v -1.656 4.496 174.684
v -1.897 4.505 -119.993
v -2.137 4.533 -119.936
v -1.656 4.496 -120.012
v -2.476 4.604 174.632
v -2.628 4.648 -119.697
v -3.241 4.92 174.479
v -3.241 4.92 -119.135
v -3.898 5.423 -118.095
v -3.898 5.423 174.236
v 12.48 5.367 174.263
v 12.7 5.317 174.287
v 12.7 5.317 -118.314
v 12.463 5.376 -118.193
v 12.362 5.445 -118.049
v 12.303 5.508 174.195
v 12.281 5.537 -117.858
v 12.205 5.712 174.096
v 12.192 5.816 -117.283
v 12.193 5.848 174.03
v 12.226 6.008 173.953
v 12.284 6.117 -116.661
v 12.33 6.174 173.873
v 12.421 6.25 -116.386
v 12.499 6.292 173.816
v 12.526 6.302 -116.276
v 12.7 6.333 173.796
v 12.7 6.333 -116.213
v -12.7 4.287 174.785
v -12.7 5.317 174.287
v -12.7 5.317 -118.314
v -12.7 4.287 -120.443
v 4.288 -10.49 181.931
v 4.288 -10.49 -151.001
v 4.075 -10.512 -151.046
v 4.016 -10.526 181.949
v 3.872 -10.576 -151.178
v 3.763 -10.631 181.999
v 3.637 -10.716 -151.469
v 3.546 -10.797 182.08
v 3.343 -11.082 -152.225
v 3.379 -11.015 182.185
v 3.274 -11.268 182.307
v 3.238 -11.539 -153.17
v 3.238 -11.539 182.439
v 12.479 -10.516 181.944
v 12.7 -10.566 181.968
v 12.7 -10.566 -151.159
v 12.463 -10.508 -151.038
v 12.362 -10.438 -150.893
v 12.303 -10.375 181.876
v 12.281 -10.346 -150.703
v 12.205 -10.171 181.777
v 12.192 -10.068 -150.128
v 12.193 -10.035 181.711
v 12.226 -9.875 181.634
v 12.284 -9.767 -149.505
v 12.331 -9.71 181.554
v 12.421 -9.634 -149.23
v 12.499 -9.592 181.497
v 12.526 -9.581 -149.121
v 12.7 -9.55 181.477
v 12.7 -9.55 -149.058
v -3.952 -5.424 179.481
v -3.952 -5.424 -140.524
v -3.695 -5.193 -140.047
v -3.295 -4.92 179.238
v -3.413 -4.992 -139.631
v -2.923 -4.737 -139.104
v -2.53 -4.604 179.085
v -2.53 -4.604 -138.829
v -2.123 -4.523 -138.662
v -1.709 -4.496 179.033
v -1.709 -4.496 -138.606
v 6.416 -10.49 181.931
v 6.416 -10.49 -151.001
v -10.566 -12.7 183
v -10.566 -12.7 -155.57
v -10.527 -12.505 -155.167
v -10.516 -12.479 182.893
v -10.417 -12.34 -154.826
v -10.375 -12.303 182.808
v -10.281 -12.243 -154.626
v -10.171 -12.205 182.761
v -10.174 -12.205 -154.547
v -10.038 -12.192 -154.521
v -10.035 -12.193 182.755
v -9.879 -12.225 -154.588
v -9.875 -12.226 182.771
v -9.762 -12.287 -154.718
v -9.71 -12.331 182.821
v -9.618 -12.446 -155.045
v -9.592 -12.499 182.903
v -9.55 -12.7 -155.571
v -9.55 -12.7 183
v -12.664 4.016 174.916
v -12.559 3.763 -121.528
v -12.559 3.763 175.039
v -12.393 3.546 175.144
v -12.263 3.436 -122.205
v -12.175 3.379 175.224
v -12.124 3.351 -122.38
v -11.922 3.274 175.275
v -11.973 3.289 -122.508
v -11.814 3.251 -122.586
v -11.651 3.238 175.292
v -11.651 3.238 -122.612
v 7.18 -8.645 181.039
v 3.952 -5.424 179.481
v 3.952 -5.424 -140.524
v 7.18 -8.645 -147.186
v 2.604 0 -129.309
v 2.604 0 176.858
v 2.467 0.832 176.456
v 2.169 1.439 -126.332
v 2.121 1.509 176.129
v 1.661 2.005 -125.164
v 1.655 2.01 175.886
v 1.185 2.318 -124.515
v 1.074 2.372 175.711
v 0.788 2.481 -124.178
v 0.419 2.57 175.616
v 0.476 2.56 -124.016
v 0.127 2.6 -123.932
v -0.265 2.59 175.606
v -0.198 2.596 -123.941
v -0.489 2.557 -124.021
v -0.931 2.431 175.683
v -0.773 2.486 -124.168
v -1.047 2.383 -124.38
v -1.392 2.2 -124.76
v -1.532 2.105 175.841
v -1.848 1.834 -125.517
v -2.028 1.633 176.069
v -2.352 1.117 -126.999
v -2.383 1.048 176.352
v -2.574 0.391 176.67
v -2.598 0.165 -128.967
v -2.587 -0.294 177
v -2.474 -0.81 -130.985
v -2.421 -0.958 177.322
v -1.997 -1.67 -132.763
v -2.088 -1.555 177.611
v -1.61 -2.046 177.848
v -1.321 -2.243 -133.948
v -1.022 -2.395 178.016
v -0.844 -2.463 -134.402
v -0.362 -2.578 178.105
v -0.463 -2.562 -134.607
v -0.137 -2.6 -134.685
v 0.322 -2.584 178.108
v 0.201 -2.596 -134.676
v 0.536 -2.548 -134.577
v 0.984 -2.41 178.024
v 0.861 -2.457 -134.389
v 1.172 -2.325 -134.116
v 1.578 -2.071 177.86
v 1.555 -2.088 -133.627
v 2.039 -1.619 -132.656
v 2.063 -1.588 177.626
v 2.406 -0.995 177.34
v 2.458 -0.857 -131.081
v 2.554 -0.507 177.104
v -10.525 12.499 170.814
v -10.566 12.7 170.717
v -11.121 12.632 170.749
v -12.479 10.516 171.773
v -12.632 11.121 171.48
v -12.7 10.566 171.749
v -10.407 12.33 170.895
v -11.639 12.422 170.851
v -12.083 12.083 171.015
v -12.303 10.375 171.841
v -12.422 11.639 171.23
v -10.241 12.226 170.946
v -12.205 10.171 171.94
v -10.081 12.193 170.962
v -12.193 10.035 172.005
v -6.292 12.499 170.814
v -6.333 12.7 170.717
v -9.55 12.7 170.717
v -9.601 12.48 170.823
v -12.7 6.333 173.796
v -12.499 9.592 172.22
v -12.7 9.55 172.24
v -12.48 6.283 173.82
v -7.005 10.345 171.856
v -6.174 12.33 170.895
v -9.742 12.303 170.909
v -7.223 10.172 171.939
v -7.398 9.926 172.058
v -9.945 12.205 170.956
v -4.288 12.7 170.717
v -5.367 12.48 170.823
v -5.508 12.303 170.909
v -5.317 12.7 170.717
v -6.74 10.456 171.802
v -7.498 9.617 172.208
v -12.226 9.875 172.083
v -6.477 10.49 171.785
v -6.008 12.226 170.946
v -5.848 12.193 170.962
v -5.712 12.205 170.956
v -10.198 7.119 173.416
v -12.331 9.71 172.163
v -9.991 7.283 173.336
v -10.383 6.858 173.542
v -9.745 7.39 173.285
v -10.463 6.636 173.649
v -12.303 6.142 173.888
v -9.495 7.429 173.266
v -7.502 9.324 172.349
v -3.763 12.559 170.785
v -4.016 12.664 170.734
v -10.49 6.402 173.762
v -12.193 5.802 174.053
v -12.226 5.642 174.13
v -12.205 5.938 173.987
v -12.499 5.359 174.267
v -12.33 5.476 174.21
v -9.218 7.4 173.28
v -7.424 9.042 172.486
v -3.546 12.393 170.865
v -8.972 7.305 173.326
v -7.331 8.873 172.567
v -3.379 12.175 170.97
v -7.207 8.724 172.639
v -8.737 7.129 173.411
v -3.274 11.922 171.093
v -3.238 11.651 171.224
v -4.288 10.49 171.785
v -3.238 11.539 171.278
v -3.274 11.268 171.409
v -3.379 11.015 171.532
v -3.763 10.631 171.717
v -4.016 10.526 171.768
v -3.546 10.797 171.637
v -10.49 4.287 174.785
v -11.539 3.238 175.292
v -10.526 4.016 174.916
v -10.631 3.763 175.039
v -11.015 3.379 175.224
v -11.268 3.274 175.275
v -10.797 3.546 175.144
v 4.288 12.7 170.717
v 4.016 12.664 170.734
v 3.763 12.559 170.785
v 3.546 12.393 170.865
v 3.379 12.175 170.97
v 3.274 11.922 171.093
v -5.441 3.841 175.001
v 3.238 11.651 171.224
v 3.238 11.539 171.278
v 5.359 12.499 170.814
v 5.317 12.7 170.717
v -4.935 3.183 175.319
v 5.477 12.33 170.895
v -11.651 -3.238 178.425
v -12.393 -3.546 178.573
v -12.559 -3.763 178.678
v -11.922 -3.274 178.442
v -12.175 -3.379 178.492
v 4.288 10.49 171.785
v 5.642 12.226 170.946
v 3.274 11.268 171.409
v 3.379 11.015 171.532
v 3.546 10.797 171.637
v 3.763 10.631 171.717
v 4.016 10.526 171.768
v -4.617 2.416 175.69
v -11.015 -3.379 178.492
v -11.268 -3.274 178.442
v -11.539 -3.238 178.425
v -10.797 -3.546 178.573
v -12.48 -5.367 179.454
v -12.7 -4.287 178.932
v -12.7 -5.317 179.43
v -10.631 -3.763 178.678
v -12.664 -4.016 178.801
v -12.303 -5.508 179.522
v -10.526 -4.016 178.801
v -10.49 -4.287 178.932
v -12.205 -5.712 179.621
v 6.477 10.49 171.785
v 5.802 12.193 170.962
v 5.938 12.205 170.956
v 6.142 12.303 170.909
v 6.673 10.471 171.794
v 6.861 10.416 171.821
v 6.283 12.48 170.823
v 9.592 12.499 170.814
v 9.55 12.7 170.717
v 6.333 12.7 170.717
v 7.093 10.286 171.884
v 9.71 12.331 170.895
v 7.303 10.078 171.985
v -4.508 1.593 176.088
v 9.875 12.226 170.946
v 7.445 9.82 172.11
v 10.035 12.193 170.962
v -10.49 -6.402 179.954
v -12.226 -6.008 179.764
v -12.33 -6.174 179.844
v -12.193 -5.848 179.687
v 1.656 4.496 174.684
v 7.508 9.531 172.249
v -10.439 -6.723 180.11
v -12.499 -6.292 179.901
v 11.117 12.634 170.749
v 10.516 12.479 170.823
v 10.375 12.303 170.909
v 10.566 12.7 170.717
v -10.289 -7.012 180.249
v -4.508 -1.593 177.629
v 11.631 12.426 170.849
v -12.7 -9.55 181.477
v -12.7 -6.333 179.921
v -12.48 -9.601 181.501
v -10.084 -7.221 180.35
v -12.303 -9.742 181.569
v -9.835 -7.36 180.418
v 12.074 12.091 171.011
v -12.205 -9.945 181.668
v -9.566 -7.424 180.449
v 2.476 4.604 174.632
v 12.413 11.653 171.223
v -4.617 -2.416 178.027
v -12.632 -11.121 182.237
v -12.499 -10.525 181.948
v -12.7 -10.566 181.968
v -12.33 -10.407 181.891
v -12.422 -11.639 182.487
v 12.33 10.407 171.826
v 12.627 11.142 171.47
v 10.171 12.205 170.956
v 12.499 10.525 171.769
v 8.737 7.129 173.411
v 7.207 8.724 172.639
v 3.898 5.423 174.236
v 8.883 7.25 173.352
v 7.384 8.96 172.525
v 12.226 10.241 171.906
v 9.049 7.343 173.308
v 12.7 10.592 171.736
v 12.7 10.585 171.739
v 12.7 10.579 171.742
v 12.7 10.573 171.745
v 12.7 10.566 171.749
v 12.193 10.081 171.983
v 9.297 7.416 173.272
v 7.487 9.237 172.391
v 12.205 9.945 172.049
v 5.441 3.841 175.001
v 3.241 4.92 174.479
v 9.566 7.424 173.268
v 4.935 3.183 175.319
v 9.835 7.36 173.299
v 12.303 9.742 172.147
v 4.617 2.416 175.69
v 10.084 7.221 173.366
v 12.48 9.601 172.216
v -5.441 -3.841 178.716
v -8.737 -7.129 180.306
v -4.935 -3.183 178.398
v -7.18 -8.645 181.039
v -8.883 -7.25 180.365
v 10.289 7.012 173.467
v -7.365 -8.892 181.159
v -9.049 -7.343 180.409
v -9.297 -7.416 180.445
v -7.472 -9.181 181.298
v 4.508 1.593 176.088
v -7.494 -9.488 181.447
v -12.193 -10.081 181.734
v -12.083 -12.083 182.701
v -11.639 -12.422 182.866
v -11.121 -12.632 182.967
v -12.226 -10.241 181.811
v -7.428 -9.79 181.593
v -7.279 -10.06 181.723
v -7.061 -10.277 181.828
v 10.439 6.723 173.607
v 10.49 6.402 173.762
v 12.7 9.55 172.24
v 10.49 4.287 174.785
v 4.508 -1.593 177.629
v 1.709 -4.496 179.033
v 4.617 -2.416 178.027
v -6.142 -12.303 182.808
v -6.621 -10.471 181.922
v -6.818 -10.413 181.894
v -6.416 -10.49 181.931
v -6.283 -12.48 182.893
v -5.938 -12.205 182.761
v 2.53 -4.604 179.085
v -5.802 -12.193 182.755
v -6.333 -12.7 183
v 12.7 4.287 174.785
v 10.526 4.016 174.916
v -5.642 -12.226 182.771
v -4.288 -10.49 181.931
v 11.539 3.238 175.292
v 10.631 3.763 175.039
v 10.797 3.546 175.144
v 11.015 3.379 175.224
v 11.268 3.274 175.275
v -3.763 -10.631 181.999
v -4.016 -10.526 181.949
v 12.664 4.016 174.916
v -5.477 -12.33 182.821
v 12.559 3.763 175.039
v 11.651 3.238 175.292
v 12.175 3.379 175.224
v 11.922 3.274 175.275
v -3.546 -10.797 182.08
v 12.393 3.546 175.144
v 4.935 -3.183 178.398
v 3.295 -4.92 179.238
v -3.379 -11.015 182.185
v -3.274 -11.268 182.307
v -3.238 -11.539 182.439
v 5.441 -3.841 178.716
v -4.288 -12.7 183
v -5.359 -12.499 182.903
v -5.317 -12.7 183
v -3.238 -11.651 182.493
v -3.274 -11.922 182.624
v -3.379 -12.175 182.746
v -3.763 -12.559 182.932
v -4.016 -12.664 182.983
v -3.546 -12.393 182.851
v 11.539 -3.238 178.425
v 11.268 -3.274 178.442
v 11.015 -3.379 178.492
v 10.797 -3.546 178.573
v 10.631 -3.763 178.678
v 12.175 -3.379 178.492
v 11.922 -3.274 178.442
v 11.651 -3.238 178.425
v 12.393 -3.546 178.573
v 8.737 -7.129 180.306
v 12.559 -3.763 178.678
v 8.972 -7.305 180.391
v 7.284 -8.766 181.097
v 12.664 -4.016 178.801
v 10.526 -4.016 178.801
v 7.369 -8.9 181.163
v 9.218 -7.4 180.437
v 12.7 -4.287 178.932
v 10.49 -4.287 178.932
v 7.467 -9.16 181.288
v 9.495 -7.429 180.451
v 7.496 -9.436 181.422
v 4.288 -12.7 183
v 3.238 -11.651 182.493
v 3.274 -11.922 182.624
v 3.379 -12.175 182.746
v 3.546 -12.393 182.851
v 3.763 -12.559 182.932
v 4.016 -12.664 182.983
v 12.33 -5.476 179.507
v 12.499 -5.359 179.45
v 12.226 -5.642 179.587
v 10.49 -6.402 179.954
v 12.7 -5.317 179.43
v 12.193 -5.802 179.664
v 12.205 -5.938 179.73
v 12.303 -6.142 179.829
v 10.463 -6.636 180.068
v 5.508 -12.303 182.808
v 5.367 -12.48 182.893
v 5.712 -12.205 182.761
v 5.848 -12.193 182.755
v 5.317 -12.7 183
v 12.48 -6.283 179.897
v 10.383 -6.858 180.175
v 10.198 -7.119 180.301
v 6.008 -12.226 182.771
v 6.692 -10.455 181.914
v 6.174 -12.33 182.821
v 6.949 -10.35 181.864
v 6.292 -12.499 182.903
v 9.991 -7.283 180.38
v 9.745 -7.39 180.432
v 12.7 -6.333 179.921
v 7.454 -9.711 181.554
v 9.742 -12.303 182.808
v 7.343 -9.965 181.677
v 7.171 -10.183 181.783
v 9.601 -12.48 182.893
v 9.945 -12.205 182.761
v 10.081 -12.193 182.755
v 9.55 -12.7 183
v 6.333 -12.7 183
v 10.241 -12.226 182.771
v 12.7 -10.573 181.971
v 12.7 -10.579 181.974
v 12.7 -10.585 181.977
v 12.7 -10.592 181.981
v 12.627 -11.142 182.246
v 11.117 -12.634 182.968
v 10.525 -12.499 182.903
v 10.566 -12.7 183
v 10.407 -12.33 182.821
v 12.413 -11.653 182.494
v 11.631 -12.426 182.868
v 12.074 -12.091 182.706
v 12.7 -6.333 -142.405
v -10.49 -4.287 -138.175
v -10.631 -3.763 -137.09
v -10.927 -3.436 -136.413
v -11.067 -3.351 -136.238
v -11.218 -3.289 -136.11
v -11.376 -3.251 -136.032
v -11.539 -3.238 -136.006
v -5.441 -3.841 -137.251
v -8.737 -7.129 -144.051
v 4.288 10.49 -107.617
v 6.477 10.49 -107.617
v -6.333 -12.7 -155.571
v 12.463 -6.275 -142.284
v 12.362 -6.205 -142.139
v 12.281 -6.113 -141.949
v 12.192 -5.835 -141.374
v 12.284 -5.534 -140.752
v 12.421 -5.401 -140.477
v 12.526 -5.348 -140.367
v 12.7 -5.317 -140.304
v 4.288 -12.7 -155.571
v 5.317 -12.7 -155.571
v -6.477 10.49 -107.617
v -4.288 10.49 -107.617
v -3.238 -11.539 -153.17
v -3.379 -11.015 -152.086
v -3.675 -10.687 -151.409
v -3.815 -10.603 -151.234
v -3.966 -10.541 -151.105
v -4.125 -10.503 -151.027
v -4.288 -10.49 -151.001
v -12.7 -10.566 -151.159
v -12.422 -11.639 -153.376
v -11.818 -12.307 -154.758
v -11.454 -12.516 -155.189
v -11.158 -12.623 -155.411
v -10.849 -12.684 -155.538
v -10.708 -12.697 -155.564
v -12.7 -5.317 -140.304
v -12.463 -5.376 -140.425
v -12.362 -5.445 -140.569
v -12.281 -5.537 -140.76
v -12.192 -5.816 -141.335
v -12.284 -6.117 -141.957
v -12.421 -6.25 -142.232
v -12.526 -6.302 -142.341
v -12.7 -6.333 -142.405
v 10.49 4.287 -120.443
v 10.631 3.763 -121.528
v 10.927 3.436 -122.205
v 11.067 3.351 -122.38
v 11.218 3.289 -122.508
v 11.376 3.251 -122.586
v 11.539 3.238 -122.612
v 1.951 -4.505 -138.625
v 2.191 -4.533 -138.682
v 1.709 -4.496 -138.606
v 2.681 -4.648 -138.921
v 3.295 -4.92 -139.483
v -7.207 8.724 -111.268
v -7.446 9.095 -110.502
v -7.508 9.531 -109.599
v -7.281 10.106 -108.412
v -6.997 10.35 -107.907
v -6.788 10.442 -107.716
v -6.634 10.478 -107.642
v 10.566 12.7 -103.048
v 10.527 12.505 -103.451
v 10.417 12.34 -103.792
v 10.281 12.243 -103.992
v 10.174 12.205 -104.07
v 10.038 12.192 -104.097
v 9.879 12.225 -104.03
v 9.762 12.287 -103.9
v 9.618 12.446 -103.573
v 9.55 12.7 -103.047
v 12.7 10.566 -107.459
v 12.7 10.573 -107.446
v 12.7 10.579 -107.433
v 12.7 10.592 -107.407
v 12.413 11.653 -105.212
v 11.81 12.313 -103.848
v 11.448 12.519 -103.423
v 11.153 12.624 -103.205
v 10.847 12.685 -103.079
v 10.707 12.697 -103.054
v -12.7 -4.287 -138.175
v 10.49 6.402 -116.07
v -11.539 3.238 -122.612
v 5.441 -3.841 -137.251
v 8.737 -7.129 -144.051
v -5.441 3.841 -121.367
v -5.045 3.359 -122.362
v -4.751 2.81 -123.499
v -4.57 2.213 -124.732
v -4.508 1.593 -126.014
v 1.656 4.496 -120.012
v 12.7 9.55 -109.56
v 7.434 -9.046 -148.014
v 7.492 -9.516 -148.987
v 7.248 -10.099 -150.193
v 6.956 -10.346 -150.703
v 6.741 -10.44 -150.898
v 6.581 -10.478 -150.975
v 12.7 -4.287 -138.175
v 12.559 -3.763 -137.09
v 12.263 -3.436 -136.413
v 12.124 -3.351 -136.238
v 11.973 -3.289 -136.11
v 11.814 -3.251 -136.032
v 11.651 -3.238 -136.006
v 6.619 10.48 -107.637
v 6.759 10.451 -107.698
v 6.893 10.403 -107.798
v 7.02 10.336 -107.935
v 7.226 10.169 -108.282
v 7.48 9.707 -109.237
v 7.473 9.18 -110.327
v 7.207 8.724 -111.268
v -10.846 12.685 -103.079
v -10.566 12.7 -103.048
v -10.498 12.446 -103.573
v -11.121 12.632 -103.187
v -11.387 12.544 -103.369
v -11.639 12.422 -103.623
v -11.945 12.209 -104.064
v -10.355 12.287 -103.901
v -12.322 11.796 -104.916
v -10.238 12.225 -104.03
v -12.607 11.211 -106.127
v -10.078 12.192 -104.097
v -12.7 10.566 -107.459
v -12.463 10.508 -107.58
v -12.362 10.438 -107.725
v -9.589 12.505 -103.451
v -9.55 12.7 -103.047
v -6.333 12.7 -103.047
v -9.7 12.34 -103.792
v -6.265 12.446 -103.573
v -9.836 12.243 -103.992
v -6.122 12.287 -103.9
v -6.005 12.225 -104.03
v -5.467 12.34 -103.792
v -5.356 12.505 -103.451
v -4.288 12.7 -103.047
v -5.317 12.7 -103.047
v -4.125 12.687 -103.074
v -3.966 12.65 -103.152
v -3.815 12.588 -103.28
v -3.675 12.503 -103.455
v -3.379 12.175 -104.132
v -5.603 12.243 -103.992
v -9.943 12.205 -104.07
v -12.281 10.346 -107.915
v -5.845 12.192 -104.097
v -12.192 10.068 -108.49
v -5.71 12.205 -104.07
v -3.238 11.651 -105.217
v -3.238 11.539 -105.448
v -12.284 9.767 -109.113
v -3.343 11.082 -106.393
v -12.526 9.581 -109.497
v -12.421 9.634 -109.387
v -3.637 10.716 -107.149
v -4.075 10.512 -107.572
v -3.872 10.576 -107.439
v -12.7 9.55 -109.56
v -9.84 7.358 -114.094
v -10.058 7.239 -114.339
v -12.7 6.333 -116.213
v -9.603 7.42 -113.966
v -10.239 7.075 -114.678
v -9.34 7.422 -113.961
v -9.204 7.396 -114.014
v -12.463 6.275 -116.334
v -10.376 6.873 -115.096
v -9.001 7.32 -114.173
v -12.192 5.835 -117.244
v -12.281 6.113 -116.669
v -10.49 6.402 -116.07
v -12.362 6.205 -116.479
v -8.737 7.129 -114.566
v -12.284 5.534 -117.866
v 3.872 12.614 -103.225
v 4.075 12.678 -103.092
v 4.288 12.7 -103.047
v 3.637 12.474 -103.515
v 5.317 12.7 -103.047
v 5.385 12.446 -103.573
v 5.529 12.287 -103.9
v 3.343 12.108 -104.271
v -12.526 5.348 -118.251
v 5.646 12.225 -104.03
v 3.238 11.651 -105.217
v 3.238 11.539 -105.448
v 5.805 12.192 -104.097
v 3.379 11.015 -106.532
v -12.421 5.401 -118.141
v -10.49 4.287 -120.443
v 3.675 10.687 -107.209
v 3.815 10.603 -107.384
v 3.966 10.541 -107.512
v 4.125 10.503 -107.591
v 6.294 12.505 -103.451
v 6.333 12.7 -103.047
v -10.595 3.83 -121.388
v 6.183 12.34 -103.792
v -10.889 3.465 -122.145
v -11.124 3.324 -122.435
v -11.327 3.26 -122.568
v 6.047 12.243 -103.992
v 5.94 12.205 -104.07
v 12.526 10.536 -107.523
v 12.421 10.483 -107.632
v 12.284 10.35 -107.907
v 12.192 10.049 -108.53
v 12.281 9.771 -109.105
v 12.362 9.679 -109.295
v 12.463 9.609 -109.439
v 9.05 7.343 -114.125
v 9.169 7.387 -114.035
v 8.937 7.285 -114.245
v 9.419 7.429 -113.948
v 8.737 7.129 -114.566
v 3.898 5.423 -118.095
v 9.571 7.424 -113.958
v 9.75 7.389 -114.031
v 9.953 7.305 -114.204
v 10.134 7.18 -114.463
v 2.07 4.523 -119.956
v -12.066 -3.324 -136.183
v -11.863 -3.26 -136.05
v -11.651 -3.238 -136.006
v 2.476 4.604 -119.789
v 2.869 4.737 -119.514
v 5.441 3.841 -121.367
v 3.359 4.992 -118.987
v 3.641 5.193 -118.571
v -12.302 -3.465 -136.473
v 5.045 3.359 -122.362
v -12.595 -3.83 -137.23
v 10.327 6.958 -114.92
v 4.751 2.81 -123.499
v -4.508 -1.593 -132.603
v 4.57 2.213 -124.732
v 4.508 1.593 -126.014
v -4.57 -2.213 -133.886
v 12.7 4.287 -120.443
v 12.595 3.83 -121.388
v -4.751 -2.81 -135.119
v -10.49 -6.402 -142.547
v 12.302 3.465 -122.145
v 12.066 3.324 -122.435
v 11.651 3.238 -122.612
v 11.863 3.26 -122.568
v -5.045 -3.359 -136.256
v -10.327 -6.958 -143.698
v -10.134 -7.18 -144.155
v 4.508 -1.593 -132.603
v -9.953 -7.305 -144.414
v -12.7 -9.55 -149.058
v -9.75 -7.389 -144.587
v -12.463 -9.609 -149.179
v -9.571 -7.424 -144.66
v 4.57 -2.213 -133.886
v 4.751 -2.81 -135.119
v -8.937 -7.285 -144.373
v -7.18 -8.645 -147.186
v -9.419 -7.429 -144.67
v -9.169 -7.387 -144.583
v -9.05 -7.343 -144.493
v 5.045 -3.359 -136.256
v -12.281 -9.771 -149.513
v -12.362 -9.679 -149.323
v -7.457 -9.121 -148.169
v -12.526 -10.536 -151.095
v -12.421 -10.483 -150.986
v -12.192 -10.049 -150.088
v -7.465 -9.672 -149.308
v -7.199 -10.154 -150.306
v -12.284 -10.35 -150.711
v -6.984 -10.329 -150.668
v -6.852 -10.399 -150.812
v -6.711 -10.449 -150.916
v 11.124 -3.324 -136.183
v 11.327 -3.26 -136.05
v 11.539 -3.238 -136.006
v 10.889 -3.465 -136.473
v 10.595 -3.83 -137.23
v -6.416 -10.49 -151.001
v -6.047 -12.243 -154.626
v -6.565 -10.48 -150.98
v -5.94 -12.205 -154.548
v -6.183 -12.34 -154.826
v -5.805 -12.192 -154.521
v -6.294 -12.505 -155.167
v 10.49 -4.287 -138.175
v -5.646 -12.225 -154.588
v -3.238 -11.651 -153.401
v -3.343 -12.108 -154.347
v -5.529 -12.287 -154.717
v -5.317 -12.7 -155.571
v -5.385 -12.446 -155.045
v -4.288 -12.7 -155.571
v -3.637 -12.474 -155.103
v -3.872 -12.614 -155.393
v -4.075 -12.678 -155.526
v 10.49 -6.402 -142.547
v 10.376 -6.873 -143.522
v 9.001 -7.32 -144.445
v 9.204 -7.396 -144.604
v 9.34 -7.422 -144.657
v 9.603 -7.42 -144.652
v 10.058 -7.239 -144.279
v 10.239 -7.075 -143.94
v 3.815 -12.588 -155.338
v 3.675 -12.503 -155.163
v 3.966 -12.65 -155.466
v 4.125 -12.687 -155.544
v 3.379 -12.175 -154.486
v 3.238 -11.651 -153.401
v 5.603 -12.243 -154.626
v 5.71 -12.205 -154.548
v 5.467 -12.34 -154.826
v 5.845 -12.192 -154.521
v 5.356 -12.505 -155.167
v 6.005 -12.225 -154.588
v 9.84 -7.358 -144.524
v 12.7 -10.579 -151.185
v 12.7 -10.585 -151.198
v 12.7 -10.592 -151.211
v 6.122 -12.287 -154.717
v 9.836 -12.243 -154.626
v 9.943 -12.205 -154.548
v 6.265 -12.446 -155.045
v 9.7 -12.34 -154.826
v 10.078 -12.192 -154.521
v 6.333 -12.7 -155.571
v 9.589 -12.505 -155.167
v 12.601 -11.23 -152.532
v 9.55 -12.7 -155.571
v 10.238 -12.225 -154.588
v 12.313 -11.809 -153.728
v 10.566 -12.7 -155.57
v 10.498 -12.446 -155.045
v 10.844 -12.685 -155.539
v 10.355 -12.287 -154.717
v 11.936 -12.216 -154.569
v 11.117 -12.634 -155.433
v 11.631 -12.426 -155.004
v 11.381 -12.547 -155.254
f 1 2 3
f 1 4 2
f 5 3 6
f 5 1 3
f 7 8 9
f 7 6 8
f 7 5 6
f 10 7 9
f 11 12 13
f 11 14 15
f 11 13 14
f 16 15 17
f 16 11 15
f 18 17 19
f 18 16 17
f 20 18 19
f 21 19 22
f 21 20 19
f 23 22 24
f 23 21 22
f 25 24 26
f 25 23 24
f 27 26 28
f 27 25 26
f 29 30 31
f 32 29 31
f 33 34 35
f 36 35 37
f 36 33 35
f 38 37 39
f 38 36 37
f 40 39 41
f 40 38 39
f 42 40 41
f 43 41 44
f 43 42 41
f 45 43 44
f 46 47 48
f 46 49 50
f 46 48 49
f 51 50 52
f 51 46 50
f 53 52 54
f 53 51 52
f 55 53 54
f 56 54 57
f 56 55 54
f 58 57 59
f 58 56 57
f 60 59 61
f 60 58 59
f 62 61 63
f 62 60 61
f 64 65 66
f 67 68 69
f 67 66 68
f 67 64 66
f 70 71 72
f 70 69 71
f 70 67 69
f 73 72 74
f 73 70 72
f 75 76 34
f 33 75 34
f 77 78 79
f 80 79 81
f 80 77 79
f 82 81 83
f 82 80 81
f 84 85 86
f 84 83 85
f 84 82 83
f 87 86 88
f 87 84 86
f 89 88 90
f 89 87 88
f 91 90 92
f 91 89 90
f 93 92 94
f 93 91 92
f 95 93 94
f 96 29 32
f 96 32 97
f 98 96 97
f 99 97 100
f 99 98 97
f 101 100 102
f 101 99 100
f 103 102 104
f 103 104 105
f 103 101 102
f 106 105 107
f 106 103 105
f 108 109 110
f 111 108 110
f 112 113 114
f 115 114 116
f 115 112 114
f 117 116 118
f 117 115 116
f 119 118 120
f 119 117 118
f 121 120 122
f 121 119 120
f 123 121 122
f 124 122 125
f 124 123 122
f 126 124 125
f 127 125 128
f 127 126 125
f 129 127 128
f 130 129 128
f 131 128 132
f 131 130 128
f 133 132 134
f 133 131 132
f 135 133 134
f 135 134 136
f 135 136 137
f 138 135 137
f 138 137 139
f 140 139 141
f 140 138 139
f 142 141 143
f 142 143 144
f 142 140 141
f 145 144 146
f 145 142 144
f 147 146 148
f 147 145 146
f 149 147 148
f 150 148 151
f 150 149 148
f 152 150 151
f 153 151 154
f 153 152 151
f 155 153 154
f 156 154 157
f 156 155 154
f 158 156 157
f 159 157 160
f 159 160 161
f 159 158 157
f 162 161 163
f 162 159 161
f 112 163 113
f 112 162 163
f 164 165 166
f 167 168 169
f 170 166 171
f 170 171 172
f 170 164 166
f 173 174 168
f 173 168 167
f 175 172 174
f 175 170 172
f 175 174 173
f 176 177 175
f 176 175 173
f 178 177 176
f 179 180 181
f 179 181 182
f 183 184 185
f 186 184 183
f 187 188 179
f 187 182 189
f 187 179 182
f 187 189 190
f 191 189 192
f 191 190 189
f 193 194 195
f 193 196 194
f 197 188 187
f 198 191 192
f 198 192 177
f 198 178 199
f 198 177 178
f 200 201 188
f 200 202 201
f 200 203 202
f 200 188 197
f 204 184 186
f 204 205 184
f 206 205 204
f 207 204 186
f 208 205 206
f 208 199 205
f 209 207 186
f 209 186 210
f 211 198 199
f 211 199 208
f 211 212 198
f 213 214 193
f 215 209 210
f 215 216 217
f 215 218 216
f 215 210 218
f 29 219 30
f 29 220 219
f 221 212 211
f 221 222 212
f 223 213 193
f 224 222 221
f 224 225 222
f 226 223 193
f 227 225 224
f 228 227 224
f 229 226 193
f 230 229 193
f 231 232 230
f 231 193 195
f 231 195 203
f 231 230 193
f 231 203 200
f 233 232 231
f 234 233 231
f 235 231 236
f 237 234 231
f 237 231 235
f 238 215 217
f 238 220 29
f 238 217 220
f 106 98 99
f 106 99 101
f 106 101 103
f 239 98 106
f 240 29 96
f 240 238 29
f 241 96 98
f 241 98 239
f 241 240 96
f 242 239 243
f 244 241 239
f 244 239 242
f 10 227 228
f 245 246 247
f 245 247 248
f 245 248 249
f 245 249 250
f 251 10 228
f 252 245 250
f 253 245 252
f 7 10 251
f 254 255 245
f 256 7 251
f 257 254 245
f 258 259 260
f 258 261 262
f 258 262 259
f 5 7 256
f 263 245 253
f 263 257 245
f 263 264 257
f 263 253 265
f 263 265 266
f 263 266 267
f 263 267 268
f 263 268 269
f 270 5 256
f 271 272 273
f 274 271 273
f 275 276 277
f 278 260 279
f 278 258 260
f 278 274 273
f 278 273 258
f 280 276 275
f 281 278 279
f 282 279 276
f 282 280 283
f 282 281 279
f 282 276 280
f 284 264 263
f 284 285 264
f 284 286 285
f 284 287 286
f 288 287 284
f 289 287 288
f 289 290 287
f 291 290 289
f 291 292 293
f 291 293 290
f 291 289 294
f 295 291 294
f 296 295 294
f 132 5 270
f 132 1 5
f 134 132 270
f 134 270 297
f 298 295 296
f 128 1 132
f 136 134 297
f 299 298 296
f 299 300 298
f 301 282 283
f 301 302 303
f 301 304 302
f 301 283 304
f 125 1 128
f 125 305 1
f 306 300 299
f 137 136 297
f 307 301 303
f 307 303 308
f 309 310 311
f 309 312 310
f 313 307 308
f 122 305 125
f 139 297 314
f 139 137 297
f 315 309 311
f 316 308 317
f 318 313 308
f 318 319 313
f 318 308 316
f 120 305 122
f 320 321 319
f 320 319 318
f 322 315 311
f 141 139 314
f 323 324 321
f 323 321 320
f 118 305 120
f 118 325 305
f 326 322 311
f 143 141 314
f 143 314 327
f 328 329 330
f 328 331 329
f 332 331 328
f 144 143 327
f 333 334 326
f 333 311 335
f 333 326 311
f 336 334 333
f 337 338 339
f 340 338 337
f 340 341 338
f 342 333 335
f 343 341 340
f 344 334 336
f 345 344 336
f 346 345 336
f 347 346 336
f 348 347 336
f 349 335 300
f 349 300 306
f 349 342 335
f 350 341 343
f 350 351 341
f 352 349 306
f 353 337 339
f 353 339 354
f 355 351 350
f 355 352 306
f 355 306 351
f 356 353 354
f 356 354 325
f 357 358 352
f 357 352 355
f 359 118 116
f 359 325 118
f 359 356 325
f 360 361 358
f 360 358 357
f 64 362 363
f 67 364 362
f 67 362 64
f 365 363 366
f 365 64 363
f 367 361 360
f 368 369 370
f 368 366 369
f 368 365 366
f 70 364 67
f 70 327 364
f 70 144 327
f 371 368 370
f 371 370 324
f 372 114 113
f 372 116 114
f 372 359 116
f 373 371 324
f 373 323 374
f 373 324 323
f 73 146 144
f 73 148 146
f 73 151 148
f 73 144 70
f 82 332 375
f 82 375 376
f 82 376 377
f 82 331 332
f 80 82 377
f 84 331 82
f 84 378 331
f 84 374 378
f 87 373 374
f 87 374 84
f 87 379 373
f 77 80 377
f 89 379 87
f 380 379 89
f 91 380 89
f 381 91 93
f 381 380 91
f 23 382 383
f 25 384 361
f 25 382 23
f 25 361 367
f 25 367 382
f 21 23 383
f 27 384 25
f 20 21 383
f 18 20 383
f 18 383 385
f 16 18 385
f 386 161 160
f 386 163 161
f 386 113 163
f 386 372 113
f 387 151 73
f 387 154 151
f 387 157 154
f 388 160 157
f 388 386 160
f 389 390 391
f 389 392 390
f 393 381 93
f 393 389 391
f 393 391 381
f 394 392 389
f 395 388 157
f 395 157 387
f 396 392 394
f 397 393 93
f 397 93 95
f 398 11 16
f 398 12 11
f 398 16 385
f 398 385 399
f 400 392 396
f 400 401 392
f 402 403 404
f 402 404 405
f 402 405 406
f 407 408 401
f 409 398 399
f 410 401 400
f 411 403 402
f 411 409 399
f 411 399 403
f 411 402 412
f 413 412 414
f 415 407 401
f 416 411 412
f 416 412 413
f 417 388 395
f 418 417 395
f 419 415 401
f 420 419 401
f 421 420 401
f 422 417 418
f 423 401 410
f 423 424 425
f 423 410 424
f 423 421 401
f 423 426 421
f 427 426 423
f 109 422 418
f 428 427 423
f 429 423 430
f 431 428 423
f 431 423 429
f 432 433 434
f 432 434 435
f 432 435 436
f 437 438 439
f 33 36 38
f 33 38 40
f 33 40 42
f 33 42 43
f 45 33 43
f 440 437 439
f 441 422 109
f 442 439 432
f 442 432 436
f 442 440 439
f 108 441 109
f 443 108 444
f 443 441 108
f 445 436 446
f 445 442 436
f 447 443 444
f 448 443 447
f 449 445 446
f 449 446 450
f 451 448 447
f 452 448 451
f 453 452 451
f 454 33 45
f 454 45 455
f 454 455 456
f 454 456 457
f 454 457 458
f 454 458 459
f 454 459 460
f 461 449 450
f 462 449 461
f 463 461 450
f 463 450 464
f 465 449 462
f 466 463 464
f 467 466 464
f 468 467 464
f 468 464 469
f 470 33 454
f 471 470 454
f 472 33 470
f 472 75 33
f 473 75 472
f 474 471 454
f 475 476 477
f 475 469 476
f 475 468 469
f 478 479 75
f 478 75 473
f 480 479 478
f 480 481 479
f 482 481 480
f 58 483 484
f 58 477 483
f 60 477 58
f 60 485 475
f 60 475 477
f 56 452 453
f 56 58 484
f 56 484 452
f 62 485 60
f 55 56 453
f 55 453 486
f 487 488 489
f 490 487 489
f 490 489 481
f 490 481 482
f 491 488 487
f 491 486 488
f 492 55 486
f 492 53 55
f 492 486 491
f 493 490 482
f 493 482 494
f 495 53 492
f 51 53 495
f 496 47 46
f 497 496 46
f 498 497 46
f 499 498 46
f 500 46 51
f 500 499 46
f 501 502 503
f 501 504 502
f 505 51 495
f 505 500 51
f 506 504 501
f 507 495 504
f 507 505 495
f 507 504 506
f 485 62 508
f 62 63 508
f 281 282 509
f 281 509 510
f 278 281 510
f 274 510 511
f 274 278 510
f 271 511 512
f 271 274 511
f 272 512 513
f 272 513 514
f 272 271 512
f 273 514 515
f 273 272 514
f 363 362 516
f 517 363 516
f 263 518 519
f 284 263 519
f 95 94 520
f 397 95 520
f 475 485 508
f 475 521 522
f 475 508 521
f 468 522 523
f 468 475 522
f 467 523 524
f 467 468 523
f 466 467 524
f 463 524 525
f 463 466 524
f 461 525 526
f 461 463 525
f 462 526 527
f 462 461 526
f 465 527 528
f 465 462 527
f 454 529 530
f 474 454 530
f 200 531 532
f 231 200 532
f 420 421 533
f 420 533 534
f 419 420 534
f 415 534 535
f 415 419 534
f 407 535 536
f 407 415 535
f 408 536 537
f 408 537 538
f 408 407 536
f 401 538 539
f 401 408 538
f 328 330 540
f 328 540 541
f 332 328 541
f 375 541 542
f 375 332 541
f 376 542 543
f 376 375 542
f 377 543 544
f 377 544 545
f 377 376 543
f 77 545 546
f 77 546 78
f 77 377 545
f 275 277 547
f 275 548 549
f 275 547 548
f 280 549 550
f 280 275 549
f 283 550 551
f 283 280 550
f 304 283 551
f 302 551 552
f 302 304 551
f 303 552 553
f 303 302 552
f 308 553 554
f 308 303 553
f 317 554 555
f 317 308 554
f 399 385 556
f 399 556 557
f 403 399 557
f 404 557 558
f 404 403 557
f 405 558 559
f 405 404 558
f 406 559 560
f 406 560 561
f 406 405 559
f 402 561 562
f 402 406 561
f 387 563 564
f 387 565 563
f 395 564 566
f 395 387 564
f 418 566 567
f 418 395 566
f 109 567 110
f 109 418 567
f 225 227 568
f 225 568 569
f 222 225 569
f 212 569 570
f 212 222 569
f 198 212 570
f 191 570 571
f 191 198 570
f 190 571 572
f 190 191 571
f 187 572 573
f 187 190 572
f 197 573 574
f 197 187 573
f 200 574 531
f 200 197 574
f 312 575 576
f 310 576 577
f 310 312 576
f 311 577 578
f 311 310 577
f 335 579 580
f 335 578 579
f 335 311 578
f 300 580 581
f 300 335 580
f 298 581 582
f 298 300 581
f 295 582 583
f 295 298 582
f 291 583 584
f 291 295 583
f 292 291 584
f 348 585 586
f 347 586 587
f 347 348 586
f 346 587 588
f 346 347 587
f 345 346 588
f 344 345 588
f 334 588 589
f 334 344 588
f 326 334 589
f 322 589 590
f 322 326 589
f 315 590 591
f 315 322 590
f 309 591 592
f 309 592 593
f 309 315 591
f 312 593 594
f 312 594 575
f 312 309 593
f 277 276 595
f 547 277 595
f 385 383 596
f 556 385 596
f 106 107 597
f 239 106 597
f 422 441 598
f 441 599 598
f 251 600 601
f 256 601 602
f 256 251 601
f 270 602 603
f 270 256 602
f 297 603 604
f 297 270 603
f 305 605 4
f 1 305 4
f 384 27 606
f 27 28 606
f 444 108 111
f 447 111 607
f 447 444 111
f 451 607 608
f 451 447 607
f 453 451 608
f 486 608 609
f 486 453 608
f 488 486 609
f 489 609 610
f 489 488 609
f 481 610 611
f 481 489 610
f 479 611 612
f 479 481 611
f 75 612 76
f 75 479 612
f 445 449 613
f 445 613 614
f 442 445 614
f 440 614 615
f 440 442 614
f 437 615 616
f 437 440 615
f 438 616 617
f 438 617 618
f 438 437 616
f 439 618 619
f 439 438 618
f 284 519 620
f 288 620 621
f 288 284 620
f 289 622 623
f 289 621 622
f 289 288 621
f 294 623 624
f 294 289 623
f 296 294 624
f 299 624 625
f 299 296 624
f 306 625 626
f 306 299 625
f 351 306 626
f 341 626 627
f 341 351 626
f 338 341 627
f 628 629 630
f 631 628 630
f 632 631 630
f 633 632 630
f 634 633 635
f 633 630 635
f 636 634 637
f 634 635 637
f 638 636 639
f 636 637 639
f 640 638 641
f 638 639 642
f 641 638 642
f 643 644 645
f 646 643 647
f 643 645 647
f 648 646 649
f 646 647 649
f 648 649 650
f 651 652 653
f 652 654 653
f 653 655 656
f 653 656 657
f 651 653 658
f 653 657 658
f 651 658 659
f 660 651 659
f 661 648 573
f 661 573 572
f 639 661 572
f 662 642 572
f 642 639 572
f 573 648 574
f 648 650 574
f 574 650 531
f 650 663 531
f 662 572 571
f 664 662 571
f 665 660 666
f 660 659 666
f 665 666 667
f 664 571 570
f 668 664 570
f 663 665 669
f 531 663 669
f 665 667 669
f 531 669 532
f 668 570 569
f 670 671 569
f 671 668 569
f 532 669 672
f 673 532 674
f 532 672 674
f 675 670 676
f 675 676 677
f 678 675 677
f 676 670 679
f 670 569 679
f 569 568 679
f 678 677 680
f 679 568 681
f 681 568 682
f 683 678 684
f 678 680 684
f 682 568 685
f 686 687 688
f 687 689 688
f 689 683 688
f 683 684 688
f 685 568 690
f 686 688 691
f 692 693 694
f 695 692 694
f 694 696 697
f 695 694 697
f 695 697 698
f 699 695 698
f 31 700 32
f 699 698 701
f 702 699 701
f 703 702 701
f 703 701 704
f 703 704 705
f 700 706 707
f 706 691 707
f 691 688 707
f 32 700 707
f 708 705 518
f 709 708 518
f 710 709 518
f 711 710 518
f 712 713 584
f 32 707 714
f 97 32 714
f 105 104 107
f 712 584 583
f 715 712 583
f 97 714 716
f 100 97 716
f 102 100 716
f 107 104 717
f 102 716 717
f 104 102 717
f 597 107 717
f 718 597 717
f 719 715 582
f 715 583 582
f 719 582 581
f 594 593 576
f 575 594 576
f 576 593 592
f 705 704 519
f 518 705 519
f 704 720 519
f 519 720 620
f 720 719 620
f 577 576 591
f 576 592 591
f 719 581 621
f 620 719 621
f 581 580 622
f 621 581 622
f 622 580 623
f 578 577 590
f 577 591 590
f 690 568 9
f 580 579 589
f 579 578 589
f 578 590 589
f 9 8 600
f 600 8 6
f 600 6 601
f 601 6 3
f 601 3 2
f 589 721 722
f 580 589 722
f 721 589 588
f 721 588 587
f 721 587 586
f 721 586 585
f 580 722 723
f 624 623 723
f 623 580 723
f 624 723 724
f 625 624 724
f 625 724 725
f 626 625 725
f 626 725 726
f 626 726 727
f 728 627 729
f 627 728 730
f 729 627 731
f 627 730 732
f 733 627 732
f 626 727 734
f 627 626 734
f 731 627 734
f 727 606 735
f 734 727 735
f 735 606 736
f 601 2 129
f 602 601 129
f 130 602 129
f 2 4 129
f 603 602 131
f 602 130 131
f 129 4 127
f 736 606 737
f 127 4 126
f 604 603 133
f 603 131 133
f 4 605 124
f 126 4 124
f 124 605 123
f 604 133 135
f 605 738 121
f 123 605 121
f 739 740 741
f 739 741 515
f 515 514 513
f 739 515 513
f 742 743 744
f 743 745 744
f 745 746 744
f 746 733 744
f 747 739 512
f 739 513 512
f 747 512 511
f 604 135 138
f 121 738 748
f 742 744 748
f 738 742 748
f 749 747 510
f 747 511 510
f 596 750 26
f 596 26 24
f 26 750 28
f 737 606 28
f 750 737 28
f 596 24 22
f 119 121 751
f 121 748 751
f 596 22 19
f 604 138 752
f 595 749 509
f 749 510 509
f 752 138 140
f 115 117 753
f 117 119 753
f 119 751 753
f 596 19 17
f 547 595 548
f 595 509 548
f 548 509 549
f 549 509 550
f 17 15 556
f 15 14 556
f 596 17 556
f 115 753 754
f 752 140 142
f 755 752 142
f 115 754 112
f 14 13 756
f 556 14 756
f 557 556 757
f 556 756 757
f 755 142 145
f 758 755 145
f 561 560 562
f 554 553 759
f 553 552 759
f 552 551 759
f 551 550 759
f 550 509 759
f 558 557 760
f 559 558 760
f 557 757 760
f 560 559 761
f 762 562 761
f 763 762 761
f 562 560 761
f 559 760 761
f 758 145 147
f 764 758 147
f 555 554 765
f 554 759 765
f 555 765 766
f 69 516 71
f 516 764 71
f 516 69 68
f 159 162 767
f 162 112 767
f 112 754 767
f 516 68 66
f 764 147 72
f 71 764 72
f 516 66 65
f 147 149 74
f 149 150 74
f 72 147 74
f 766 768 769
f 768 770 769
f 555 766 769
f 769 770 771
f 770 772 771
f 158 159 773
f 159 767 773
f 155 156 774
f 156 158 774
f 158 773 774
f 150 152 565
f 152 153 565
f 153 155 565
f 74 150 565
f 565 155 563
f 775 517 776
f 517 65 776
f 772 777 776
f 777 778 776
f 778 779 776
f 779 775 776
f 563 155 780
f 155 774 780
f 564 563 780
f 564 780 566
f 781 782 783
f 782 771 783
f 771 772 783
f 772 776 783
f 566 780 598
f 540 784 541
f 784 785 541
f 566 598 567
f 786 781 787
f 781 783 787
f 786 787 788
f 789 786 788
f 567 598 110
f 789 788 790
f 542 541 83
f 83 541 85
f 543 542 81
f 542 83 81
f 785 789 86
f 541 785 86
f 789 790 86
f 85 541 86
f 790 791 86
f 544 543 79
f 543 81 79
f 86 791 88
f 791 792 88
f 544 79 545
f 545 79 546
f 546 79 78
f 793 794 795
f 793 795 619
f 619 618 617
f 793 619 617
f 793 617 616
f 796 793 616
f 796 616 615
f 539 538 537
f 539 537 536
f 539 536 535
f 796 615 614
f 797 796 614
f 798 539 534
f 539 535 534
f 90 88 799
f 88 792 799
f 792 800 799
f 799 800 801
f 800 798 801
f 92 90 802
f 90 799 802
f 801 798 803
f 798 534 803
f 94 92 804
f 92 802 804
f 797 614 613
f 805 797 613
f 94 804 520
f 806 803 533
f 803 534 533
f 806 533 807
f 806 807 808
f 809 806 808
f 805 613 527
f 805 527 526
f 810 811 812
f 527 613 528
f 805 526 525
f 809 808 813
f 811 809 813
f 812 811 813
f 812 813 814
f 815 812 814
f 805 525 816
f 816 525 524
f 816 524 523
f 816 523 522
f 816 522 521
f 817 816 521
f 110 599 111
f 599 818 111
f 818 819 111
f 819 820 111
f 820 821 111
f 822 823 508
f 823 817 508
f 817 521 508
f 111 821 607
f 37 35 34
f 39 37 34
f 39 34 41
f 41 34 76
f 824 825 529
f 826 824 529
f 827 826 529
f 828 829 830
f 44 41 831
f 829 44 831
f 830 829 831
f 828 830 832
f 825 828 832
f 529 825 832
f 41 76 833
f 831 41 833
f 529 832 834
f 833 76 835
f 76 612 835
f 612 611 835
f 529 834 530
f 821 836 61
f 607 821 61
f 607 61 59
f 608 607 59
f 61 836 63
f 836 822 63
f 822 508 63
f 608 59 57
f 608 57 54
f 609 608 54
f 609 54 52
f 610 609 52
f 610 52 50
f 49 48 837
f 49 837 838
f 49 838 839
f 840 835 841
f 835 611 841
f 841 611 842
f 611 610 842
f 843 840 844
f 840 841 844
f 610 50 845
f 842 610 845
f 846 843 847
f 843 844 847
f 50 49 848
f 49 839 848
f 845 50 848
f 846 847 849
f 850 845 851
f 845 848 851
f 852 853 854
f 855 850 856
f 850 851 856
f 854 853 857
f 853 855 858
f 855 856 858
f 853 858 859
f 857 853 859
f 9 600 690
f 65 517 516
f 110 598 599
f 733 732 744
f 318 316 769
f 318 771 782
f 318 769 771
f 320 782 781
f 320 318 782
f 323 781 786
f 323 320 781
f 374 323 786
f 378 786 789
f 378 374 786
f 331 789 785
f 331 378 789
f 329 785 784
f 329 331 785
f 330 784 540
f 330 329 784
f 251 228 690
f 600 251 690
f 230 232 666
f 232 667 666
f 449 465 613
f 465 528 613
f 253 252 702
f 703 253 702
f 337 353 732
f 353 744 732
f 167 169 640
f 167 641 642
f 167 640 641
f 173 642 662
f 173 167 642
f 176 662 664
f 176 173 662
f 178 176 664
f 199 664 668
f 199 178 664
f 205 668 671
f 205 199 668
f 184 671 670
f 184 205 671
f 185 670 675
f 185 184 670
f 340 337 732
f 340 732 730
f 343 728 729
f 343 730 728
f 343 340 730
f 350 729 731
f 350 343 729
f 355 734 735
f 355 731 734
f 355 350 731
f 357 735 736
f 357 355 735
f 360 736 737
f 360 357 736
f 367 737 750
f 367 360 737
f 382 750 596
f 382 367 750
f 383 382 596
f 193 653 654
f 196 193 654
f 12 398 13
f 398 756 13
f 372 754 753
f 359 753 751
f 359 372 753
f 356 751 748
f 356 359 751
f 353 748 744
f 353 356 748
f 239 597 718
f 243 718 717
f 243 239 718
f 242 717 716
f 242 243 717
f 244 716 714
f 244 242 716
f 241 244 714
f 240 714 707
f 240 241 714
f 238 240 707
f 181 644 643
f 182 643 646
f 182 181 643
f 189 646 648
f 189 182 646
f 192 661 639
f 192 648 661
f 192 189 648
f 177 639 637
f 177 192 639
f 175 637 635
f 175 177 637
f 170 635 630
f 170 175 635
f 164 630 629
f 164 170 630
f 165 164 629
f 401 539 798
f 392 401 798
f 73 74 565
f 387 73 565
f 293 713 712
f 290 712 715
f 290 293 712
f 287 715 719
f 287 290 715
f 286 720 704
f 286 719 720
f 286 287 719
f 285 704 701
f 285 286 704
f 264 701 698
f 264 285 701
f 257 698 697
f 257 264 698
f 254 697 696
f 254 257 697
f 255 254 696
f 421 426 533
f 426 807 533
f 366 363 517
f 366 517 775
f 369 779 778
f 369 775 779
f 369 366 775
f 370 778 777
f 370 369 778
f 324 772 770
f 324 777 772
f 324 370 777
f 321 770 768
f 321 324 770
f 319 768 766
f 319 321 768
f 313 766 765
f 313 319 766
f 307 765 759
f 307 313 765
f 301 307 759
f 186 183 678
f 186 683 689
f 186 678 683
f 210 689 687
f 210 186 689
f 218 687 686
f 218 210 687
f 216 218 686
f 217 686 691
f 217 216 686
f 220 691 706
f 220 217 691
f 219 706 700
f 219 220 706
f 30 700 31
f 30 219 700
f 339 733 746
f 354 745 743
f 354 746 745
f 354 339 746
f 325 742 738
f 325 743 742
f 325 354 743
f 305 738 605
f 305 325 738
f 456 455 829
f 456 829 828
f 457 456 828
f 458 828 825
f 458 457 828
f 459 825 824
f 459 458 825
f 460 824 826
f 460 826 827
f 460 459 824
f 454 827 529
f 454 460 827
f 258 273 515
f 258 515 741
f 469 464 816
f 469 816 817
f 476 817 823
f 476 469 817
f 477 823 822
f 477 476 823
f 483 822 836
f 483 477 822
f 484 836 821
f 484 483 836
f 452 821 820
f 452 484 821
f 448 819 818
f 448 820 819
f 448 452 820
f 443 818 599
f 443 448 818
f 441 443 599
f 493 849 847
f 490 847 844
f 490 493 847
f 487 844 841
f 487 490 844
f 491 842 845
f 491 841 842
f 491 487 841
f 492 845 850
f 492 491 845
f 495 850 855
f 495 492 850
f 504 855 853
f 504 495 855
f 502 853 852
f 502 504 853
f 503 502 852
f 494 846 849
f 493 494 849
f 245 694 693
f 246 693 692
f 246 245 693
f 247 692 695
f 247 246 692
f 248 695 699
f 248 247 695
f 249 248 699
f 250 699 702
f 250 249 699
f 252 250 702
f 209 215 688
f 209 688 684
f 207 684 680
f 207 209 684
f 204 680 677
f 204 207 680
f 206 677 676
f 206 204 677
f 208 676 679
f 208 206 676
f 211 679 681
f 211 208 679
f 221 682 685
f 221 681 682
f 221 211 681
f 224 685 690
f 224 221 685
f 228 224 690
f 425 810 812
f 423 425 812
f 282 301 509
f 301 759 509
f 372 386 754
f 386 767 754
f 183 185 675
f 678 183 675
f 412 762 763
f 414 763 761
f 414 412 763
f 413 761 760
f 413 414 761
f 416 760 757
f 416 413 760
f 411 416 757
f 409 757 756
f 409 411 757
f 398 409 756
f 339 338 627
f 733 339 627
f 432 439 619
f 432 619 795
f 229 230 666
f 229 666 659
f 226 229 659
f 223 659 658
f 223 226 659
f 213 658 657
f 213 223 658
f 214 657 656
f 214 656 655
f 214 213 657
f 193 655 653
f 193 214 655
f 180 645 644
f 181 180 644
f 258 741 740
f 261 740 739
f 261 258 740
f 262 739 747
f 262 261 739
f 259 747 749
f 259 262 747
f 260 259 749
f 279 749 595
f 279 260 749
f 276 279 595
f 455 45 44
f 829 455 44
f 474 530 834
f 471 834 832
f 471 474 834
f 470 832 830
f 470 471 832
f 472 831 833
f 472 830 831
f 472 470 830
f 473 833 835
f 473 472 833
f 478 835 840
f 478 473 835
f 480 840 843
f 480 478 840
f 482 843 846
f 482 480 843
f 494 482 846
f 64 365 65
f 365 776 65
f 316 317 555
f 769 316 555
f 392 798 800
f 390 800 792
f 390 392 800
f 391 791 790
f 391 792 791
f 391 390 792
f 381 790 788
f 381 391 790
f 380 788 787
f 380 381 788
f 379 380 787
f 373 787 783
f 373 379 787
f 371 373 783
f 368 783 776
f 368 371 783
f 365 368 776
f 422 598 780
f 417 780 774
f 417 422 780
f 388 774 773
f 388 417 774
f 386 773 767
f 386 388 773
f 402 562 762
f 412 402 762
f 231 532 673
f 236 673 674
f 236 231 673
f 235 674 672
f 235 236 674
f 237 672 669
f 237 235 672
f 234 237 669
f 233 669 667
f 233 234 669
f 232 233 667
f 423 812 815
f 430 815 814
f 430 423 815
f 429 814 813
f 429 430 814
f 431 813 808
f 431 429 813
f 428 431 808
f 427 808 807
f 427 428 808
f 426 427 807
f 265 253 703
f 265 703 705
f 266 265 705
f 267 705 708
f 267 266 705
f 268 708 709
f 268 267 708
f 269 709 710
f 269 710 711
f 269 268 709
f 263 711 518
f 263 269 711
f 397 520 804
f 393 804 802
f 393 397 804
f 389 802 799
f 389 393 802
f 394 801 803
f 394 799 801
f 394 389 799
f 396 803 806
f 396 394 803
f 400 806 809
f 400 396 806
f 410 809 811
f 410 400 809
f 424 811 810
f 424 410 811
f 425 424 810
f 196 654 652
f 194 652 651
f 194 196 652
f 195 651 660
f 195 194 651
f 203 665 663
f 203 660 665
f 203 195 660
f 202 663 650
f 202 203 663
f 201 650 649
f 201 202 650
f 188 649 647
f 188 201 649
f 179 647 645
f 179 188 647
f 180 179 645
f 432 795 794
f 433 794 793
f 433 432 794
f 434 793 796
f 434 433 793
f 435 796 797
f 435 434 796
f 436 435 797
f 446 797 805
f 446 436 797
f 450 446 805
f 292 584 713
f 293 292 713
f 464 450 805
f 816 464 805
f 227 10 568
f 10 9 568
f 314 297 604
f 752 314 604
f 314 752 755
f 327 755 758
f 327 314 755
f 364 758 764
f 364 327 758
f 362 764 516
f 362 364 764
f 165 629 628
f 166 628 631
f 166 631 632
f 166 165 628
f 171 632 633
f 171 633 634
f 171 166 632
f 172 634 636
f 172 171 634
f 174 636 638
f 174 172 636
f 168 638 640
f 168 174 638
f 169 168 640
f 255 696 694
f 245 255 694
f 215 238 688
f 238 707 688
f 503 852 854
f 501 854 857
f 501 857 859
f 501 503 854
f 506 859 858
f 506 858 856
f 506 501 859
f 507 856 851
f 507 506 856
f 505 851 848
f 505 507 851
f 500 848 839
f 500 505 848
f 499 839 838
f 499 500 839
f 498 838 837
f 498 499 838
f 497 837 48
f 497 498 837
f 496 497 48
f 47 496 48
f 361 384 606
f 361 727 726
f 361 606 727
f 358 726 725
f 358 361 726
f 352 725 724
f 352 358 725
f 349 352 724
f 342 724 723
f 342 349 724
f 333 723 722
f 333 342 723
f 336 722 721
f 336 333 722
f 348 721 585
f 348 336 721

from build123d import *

# Parameters (mm, degrees)
SKETCH1_R               = 2.6035
BOSS_EXTRUDE1_DEPTH     = 185
CUT_EXTRUDE4_DEPTH      = 1
CUT_EXTRUDE4_DEPTH_BACK = 26.4


with BuildPart() as part:
    # Sketch1 → Boss-Extrude1 (new body, symmetric)
    with BuildSketch(Plane.XY):
        with BuildLine():
            Line((-7.179650497, -8.645192506), (-3.952270251, -5.423690499))
            ThreePointArc((-3.952270251, -5.423690499), (-2.922936451, -4.736929036), (-1.709253557, -4.4958))
            Line((-1.709253557, -4.4958), (1.709253557, -4.4958))
            ThreePointArc((1.709253557, -4.4958), (2.922936451, -4.736929036), (3.952270251, -5.423690499))
            Line((3.952270251, -5.423690499), (7.179650497, -8.645192506))
            ThreePointArc((7.179650497, -8.645192506), (7.41473083, -9.822813117), (6.416408329, -10.4902))
            Line((6.416408329, -10.4902), (4.287512407, -10.4902))
            ThreePointArc((4.287512407, -10.4902), (3.54574862, -10.79744862), (3.2385, -11.539212407))
            Line((3.2385, -11.539212407), (3.2385, -11.650987593))
            ThreePointArc((3.2385, -11.650987593), (3.54574862, -12.39275138), (4.287512407, -12.7))
            Line((4.287512407, -12.7), (5.317126718, -12.7))
            ThreePointArc((5.317126718, -12.7), (5.825126718, -12.192), (6.333126718, -12.7))
            Line((6.333126718, -12.7), (9.550443118, -12.7))
            ThreePointArc((9.550443118, -12.7), (10.058366869, -12.192000006), (10.566443095, -12.699847501))
            ThreePointArc((10.566443095, -12.699847501), (12.082537762, -12.08250727), (12.699846982, -10.566399977))
            ThreePointArc((12.699846982, -10.566399977), (12.192000006, -10.058323491), (12.7, -9.5504))
            Line((12.7, -9.5504), (12.7, -6.3330836))
            ThreePointArc((12.7, -6.3330836), (12.192, -5.8250836), (12.7, -5.3170836))
            Line((12.7, -5.3170836), (12.7, -4.287469289))
            ThreePointArc((12.7, -4.287469289), (12.39275138, -3.545705502), (11.650987593, -3.238456882))
            Line((11.650987593, -3.238456882), (11.539212407, -3.238456882))
            ThreePointArc((11.539212407, -3.238456882), (10.79744862, -3.545705502), (10.4902, -4.287469289))
            Line((10.4902, -4.287469289), (10.4902, -6.402089023))
            ThreePointArc((10.4902, -6.402089023), (9.856505071, -7.351067942), (8.737131347, -7.129408934))
            Line((8.737131347, -7.129408934), (5.441005833, -3.840816462))
            ThreePointArc((5.441005833, -3.840816462), (4.750877967, -2.809883091), (4.5085, -1.593185507))
            Line((4.5085, -1.593185507), (4.5085, 1.593185507))
            ThreePointArc((4.5085, 1.593185507), (4.750877967, 2.809883091), (5.441005833, 3.840816462))
            Line((5.441005833, 3.840816462), (8.737131347, 7.129408934))
            ThreePointArc((8.737131347, 7.129408934), (9.856505071, 7.351067942), (10.4902, 6.402089023))
            Line((10.4902, 6.402089023), (10.4902, 4.287469289))
            ThreePointArc((10.4902, 4.287469289), (10.79744862, 3.545705502), (11.539212407, 3.238456882))
            Line((11.539212407, 3.238456882), (11.650987593, 3.238456882))
            ThreePointArc((11.650987593, 3.238456882), (12.39275138, 3.545705502), (12.7, 4.287469289))
            Line((12.7, 4.287469289), (12.7, 5.3170836))
            ThreePointArc((12.7, 5.3170836), (12.192, 5.8250836), (12.7, 6.3330836))
            Line((12.7, 6.3330836), (12.7, 9.5504))
            ThreePointArc((12.7, 9.5504), (12.192000006, 10.058323491), (12.699846982, 10.566399977))
            ThreePointArc((12.699846982, 10.566399977), (12.082537762, 12.08250727), (10.566443095, 12.699847501))
            ThreePointArc((10.566443095, 12.699847501), (10.058366869, 12.192000006), (9.550443118, 12.7))
            Line((9.550443118, 12.7), (6.333126718, 12.7))
            ThreePointArc((6.333126718, 12.7), (5.825126718, 12.192), (5.317126718, 12.7))
            Line((5.317126718, 12.7), (4.287512407, 12.7))
            ThreePointArc((4.287512407, 12.7), (3.54574862, 12.39275138), (3.2385, 11.650987593))
            Line((3.2385, 11.650987593), (3.2385, 11.539212407))
            ThreePointArc((3.2385, 11.539212407), (3.54574862, 10.79744862), (4.287512407, 10.4902))
            Line((4.287512407, 10.4902), (6.476788598, 10.4902))
            ThreePointArc((6.476788598, 10.4902), (7.432222385, 9.85140422), (7.207036008, 8.724370562))
            Line((7.207036008, 8.724370562), (3.898272566, 5.423169045))
            ThreePointArc((3.898272566, 5.423169045), (2.869120213, 4.736787962), (1.655778399, 4.4958))
            Line((1.655778399, 4.4958), (-1.655778399, 4.4958))
            ThreePointArc((-1.655778399, 4.4958), (-2.869120213, 4.736787962), (-3.898272566, 5.423169045))
            Line((-3.898272566, 5.423169045), (-7.207036008, 8.724370562))
            ThreePointArc((-7.207036008, 8.724370562), (-7.432222385, 9.85140422), (-6.476788598, 10.4902))
            Line((-6.476788598, 10.4902), (-4.287512407, 10.4902))
            ThreePointArc((-4.287512407, 10.4902), (-3.54574862, 10.79744862), (-3.2385, 11.539212407))
            Line((-3.2385, 11.539212407), (-3.2385, 11.650987593))
            ThreePointArc((-3.2385, 11.650987593), (-3.54574862, 12.39275138), (-4.287512407, 12.7))
            Line((-4.287512407, 12.7), (-5.317126718, 12.7))
            ThreePointArc((-5.317126718, 12.7), (-5.825126718, 12.192), (-6.333126718, 12.7))
            Line((-6.333126718, 12.7), (-9.550443118, 12.7))
            ThreePointArc((-9.550443118, 12.7), (-10.058366869, 12.192000006), (-10.566443095, 12.699847501))
            ThreePointArc((-10.566443095, 12.699847501), (-12.082537762, 12.08250727), (-12.699846982, 10.566399977))
            ThreePointArc((-12.699846982, 10.566399977), (-12.192000006, 10.058323491), (-12.7, 9.5504))
            Line((-12.7, 9.5504), (-12.7, 6.3330836))
            ThreePointArc((-12.7, 6.3330836), (-12.192, 5.8250836), (-12.7, 5.3170836))
            Line((-12.7, 5.3170836), (-12.7, 4.287469289))
            ThreePointArc((-12.7, 4.287469289), (-12.39275138, 3.545705502), (-11.650987593, 3.238456882))
            Line((-11.650987593, 3.238456882), (-11.539212407, 3.238456882))
            ThreePointArc((-11.539212407, 3.238456882), (-10.79744862, 3.545705502), (-10.4902, 4.287469289))
            Line((-10.4902, 4.287469289), (-10.4902, 6.402089023))
            ThreePointArc((-10.4902, 6.402089023), (-9.856505071, 7.351067942), (-8.737131347, 7.129408934))
            Line((-8.737131347, 7.129408934), (-5.441005833, 3.840816462))
            ThreePointArc((-5.441005833, 3.840816462), (-4.750877967, 2.809883091), (-4.5085, 1.593185507))
            Line((-4.5085, 1.593185507), (-4.5085, -1.593185507))
            ThreePointArc((-4.5085, -1.593185507), (-4.750877967, -2.809883091), (-5.441005833, -3.840816462))
            Line((-5.441005833, -3.840816462), (-8.737131347, -7.129408934))
            ThreePointArc((-8.737131347, -7.129408934), (-9.856505071, -7.351067942), (-10.4902, -6.402089023))
            Line((-10.4902, -6.402089023), (-10.4902, -4.287469289))
            ThreePointArc((-10.4902, -4.287469289), (-10.79744862, -3.545705502), (-11.539212407, -3.238456882))
            Line((-11.539212407, -3.238456882), (-11.650987593, -3.238456882))
            ThreePointArc((-11.650987593, -3.238456882), (-12.39275138, -3.545705502), (-12.7, -4.287469289))
            Line((-12.7, -4.287469289), (-12.7, -5.3170836))
            ThreePointArc((-12.7, -5.3170836), (-12.192, -5.8250836), (-12.7, -6.3330836))
            Line((-12.7, -6.3330836), (-12.7, -9.5504))
            ThreePointArc((-12.7, -9.5504), (-12.192000006, -10.058323491), (-12.699846982, -10.566399977))
            ThreePointArc((-12.699846982, -10.566399977), (-12.082537762, -12.08250727), (-10.566443095, -12.699847501))
            ThreePointArc((-10.566443095, -12.699847501), (-10.058366869, -12.192000006), (-9.550443118, -12.7))
            Line((-9.550443118, -12.7), (-6.333126718, -12.7))
            ThreePointArc((-6.333126718, -12.7), (-5.825126718, -12.192), (-5.317126718, -12.7))
            Line((-5.317126718, -12.7), (-4.287512407, -12.7))
            ThreePointArc((-4.287512407, -12.7), (-3.54574862, -12.39275138), (-3.2385, -11.650987593))
            Line((-3.2385, -11.650987593), (-3.2385, -11.539212407))
            ThreePointArc((-3.2385, -11.539212407), (-3.54574862, -10.79744862), (-4.287512407, -10.4902))
            Line((-4.287512407, -10.4902), (-6.416408329, -10.4902))
            ThreePointArc((-6.416408329, -10.4902), (-7.41473083, -9.822813117), (-7.179650497, -8.645192506))
        make_face()
        Circle(SKETCH1_R, mode=Mode.SUBTRACT)
    extrude(amount=BOSS_EXTRUDE1_DEPTH, both=True)

    # Sketch2 → Cut-Extrude4 (cut, two sides)
    with BuildSketch(Plane(origin=(12.7, 0, 0), x_dir=(0, 0, -1), z_dir=(1, 0, 0))) as cut_extrude4_sk:
        Polygon((-164.46464742, 25.628344266), (-188.10813452, -23.262665694), (-213.259000162, -11.09981269), (-189.615513062, 37.79119727), align=None)
        Polygon((76.313561137, 25.628344266), (208.869262725, -38.475036358), (239.869388394, 25.628344266), (107.313686806, 89.73172489), align=None)
    extrude(amount=CUT_EXTRUDE4_DEPTH, mode=Mode.SUBTRACT)
    extrude(cut_extrude4_sk.sketch, amount=-CUT_EXTRUDE4_DEPTH_BACK, mode=Mode.SUBTRACT)


solid = part.part
